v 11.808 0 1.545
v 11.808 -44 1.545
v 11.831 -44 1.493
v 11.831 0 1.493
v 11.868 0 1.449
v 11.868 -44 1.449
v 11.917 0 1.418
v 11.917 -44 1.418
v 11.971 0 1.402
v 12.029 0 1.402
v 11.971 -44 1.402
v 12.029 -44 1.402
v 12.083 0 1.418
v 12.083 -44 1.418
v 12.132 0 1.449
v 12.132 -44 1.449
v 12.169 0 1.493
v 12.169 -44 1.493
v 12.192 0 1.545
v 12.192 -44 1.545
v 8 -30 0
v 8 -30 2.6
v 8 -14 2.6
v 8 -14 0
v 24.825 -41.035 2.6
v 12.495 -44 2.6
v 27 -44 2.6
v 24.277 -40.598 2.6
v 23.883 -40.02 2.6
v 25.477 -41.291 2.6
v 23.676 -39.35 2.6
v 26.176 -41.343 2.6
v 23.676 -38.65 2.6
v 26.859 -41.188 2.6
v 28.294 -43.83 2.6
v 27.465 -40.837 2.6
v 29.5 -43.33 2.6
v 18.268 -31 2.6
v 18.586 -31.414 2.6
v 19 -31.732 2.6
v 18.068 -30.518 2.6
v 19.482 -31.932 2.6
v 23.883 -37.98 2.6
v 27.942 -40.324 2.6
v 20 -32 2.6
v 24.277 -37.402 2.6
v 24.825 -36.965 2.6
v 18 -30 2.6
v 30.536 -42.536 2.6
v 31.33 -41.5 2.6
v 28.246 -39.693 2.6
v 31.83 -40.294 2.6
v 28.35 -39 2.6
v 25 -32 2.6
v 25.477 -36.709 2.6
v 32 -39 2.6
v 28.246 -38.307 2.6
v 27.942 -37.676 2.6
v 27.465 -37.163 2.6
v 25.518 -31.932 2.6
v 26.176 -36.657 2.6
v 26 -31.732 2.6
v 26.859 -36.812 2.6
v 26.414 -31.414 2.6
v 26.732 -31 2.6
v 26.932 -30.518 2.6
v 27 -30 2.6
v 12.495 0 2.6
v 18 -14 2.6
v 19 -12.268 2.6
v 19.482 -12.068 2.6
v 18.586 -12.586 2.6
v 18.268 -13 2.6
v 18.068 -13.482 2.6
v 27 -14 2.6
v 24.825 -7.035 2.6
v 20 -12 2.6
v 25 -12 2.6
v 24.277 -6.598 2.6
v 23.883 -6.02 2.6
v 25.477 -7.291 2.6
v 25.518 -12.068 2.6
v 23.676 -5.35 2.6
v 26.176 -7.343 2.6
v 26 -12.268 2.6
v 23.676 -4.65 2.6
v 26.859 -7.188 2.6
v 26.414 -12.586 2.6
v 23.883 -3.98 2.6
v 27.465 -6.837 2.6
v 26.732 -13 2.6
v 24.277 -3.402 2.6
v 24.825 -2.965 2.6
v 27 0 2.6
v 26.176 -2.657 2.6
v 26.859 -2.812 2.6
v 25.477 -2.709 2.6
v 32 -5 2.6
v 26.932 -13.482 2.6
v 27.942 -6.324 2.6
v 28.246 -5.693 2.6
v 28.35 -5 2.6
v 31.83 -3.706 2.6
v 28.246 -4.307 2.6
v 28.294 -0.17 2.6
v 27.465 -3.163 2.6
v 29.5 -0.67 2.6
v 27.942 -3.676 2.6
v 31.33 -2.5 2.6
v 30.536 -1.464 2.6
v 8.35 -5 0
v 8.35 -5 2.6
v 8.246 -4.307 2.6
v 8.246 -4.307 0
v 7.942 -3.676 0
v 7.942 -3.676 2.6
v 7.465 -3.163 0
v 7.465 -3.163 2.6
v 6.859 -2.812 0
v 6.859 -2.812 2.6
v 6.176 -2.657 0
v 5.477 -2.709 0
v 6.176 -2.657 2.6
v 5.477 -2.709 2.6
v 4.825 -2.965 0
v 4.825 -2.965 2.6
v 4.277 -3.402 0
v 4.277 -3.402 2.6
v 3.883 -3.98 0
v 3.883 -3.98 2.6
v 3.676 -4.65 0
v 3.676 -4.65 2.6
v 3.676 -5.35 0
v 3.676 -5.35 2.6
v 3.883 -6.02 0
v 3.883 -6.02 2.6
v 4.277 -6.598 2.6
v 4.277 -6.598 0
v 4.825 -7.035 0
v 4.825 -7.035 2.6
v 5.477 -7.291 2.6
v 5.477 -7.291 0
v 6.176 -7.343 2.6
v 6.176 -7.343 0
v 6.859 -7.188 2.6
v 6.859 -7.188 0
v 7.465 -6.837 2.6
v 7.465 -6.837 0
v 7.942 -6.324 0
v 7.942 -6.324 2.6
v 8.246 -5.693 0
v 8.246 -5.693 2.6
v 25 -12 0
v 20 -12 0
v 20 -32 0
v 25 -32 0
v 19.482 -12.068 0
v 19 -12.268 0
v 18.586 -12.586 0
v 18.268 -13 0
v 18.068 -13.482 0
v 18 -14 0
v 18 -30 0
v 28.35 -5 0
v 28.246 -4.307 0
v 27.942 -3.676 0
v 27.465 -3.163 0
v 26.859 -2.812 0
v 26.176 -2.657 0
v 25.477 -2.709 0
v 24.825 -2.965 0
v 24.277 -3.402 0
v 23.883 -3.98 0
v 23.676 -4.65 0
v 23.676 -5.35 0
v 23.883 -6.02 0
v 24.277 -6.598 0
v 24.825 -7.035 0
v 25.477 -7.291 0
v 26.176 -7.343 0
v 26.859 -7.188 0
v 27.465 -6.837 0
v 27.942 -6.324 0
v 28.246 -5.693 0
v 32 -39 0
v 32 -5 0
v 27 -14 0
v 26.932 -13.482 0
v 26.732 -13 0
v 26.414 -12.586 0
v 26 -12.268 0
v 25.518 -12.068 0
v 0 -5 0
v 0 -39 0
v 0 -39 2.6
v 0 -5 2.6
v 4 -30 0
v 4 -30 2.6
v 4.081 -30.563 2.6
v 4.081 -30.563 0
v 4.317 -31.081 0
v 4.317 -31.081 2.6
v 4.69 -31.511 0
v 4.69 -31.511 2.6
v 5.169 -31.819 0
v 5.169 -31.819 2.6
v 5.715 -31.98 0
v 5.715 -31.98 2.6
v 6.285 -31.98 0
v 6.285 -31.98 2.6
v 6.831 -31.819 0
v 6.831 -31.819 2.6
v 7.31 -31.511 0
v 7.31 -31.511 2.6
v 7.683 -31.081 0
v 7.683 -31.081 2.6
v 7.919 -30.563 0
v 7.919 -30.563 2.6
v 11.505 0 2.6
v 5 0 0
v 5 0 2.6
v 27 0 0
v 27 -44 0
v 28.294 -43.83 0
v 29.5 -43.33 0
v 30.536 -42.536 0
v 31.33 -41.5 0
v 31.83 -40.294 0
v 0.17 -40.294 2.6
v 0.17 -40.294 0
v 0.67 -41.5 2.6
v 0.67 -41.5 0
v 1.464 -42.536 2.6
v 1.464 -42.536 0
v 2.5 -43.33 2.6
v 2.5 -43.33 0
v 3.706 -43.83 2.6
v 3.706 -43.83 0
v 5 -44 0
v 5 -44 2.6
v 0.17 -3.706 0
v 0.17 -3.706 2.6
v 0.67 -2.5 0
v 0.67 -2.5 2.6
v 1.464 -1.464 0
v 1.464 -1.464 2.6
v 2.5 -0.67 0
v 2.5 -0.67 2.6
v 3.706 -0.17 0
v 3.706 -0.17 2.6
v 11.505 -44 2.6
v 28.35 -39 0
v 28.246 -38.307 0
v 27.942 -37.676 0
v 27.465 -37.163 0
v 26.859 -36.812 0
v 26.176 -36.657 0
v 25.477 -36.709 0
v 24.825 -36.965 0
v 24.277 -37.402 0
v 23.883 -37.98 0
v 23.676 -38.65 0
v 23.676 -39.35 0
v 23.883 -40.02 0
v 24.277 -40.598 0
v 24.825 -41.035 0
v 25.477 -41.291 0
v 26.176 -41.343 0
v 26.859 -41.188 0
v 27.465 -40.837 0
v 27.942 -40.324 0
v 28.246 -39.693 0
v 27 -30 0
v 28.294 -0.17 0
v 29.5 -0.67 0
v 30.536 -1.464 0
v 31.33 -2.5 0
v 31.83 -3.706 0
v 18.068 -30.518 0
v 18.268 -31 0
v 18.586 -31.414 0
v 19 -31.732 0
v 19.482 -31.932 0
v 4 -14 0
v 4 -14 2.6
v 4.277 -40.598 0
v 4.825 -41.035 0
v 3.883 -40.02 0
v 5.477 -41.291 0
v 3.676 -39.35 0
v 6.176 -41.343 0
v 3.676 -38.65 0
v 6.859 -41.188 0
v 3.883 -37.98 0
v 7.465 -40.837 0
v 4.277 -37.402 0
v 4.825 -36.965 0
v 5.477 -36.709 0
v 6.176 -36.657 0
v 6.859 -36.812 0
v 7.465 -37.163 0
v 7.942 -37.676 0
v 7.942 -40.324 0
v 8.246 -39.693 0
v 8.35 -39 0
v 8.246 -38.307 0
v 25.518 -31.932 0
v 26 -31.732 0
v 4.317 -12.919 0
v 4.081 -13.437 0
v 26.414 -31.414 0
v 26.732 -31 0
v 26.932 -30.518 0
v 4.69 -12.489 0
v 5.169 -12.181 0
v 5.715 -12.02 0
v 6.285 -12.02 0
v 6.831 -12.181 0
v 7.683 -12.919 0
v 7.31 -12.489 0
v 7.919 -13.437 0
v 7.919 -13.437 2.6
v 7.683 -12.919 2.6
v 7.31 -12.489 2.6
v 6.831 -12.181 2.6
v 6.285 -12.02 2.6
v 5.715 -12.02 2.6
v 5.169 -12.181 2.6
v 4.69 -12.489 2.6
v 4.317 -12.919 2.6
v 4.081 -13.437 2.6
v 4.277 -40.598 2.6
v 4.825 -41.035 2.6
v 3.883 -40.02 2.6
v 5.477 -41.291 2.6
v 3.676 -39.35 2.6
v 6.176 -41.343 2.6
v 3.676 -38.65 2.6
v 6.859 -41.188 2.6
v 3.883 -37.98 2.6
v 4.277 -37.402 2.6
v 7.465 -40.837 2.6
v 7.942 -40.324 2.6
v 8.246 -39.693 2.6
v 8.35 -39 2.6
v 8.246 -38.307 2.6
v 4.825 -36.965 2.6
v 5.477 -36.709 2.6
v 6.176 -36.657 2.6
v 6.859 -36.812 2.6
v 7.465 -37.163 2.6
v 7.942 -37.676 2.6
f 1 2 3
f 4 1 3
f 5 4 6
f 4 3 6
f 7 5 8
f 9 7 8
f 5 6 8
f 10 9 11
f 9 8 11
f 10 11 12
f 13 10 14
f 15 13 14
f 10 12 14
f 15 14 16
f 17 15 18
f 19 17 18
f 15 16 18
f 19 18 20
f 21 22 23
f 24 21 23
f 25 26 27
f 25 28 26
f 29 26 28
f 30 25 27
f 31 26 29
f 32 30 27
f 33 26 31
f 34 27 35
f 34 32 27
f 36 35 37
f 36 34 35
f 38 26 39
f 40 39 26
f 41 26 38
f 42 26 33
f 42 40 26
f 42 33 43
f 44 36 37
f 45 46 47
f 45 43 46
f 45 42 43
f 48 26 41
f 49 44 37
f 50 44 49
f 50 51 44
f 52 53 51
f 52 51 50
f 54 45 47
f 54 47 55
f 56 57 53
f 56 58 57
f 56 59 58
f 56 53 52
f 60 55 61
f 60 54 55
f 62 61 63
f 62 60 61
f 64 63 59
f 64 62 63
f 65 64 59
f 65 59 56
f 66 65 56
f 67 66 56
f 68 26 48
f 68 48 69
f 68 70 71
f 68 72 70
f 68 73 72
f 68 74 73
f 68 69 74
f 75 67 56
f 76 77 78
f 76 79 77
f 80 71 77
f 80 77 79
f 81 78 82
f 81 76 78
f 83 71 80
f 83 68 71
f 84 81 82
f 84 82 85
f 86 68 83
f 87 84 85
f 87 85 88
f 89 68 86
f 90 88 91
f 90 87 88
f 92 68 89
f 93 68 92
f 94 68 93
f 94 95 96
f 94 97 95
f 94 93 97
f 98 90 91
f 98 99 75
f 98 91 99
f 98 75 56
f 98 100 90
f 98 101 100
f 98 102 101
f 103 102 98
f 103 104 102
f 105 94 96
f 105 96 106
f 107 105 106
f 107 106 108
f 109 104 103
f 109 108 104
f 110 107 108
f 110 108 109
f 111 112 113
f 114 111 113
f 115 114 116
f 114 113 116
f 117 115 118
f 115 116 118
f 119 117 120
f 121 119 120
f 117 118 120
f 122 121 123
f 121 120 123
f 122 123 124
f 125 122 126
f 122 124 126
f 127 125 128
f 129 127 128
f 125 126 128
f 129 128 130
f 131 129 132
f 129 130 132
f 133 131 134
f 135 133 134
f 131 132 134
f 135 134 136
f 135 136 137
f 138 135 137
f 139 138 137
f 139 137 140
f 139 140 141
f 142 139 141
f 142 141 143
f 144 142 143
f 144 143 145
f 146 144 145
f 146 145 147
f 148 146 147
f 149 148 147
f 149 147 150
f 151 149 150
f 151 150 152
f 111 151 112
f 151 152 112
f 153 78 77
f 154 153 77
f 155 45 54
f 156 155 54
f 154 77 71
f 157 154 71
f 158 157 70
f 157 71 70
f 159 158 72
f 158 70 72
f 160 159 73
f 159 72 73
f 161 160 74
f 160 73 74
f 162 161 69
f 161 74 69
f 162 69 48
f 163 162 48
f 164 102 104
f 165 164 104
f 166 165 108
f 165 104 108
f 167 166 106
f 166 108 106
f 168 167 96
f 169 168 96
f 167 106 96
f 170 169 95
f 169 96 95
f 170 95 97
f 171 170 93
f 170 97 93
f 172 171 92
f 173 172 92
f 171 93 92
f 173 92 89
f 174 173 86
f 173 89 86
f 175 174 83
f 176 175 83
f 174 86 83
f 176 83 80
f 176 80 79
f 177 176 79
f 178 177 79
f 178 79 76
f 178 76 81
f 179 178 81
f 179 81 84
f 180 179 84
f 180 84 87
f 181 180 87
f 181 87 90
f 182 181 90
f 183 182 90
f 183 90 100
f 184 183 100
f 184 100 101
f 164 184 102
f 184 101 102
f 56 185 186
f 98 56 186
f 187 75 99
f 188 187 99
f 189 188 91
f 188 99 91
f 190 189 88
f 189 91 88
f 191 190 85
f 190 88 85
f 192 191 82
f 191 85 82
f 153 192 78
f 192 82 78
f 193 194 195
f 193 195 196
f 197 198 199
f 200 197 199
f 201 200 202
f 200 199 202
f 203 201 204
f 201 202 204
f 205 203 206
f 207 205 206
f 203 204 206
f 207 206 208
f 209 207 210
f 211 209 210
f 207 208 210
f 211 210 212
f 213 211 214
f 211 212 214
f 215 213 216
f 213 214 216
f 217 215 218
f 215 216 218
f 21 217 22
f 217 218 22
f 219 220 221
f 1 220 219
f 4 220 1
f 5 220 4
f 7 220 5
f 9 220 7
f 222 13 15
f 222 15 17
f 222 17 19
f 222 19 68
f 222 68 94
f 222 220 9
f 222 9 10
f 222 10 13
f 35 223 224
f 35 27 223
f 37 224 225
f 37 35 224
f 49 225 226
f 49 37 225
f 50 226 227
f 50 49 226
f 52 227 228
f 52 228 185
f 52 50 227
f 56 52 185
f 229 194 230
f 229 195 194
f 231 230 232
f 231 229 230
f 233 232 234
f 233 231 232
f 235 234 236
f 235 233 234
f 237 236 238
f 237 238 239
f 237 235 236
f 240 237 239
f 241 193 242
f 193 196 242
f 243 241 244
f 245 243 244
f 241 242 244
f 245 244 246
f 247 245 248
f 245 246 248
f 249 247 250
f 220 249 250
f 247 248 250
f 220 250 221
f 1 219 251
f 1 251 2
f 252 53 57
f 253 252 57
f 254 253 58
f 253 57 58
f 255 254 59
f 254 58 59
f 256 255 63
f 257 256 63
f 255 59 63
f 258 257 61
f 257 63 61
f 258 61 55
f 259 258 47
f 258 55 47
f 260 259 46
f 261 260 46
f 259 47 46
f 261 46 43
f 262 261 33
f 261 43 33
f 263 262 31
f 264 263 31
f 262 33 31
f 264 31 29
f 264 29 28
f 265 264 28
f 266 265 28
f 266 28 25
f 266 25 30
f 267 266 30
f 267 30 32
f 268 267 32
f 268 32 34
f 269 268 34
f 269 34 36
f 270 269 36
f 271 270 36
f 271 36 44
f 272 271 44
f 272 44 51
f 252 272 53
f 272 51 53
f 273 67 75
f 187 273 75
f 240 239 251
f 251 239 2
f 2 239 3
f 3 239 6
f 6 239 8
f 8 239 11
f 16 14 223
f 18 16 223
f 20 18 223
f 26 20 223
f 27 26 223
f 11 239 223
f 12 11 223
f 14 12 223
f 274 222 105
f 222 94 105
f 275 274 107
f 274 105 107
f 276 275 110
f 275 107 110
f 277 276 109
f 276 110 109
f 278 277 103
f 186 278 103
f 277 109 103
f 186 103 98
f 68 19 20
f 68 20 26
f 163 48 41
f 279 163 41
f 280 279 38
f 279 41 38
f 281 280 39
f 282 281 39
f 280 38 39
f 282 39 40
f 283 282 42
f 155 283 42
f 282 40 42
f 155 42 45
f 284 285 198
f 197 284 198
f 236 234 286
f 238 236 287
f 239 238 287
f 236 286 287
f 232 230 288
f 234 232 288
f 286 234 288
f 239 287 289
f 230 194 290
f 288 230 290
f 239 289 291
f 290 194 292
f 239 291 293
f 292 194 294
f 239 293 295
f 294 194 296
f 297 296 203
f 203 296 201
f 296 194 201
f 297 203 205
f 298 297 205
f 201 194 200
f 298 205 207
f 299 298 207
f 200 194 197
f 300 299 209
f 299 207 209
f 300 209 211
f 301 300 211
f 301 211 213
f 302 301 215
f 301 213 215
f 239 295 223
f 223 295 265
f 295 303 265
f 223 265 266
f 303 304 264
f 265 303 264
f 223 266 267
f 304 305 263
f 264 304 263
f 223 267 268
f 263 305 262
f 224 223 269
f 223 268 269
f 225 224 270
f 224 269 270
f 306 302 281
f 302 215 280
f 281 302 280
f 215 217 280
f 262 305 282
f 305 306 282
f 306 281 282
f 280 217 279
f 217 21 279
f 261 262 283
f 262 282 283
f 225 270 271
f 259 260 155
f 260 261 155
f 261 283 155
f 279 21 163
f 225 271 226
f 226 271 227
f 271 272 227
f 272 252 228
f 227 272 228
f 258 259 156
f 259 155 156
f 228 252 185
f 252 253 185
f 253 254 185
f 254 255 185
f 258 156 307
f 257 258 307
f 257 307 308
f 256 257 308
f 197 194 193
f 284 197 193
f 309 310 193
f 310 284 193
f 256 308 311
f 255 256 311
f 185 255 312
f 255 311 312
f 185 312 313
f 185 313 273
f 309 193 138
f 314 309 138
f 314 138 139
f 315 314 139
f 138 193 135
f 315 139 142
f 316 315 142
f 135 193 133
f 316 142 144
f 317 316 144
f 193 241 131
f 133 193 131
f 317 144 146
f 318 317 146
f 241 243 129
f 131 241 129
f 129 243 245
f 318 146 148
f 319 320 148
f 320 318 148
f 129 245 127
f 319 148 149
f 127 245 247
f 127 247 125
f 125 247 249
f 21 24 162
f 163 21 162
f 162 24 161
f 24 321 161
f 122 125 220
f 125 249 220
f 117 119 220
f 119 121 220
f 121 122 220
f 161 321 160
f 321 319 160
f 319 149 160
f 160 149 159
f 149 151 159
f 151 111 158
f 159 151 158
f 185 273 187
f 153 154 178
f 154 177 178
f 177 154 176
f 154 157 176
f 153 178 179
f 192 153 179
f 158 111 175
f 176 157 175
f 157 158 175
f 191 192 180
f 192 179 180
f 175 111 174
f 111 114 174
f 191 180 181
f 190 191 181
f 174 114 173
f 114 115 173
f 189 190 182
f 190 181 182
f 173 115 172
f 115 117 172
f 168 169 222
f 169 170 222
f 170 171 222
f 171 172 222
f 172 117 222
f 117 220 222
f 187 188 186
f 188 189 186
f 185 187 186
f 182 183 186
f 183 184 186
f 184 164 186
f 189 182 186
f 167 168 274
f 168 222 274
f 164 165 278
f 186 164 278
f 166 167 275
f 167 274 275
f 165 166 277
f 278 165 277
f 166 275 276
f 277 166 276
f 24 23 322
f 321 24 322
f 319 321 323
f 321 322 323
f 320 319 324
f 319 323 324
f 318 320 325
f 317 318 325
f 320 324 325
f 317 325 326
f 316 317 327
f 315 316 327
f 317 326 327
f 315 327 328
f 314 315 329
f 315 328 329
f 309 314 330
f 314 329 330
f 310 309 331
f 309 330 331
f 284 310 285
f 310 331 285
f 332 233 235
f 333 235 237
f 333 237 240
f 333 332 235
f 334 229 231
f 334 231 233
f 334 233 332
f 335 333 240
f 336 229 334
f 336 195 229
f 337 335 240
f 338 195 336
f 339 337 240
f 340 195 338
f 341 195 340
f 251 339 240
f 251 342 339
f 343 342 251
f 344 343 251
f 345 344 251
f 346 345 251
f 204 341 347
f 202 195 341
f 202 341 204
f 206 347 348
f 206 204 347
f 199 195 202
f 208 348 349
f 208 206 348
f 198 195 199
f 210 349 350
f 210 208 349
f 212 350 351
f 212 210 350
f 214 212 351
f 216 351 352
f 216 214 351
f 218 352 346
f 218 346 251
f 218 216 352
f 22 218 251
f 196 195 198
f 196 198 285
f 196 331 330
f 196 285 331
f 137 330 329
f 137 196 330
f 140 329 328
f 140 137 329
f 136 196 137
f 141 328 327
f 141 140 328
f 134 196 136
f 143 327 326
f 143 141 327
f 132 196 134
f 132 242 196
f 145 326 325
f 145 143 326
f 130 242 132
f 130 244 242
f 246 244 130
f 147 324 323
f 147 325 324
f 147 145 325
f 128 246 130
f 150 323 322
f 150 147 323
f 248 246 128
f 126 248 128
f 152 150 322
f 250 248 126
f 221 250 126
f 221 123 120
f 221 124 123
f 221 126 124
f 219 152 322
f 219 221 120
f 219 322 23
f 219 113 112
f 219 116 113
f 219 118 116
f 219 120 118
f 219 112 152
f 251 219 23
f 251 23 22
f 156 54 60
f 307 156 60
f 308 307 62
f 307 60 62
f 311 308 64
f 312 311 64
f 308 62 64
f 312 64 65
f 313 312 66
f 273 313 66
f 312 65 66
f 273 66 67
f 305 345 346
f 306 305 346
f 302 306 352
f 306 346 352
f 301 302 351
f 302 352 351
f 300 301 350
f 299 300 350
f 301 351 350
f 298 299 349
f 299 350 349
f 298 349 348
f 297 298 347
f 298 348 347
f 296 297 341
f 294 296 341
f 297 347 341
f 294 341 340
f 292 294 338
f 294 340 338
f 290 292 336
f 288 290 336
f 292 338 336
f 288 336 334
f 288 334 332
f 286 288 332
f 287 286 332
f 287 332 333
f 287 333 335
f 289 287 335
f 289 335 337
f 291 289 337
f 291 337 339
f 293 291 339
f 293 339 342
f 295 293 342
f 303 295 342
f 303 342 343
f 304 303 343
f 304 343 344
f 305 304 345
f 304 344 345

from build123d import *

# Parameters (mm, degrees)
F0_W     = 32
F0_H     = 44
F1_DEPTH = 2.6
F2_R     = 2.35
F3_DEPTH = 2.6
F5_DEPTH = 44.001
F6_R     = 5
F8_DEPTH = 2.601


with BuildPart() as f1:
    # F0 (on Top) → F1 (new body)
    with BuildSketch(Plane.XY):
        with Locations((16, -22)):
            Rectangle(F0_W, F0_H)
    extrude(amount=F1_DEPTH)

    # F2 (on face) → F3 (cut, through all)
    with BuildSketch(Plane.XY.offset(2.6)):
        with Locations((6, -5)):
            Circle(F2_R)
        with Locations((6, -39)):
            Circle(F2_R)
        with Locations((26, -39)):
            Circle(F2_R)
        with Locations((26, -5)):
            Circle(F2_R)
    extrude(amount=-F3_DEPTH, mode=Mode.SUBTRACT)

    # F4 (on face) → F5 (cut, through all)
    with BuildSketch(Plane.XZ.offset(44)):
        with BuildLine():
            Line((12.494805, 2.6), (11.505195, 2.6))
            Line((11.505195, 2.6), (11.807748, 1.544873))
            ThreePointArc((11.807748, 1.544873), (12, 1.4), (12.192252, 1.544873))
            Line((12.192252, 1.544873), (12.494805, 2.6))
        make_face()
    extrude(amount=-F5_DEPTH, mode=Mode.SUBTRACT)

    # F6
    f6_edges = [f1.edges().sort_by_distance(p)[0] for p in [
        (0, -44, 1.3),
        (32, -44, 1.3),
        (32, 0, 1.3),
        (0, 0, 1.3),
    ]]
    fillet(f6_edges, radius=F6_R)

    # F7 (on face) → F8 (cut, through all)
    with BuildSketch(Plane.XY.offset(2.6)):
        with BuildLine():
            Line((8, -30), (8, -14))
            ThreePointArc((8, -14), (6, -12), (4, -14))
            Line((4, -14), (4, -30))
            ThreePointArc((4, -30), (6, -32), (8, -30))
        make_face()
        with BuildLine():
            Line((25, -12), (20, -12))
            ThreePointArc((20, -12), (18.585786, -12.585786), (18, -14))
            Line((18, -14), (18, -30))
            ThreePointArc((18, -30), (18.585786, -31.414214), (20, -32))
            Line((20, -32), (25, -32))
            ThreePointArc((25, -32), (26.414214, -31.414214), (27, -30))
            Line((27, -30), (27, -14))
            ThreePointArc((27, -14), (26.414214, -12.585786), (25, -12))
        make_face()
    extrude(amount=-F8_DEPTH, mode=Mode.SUBTRACT)


solid = f1.part
